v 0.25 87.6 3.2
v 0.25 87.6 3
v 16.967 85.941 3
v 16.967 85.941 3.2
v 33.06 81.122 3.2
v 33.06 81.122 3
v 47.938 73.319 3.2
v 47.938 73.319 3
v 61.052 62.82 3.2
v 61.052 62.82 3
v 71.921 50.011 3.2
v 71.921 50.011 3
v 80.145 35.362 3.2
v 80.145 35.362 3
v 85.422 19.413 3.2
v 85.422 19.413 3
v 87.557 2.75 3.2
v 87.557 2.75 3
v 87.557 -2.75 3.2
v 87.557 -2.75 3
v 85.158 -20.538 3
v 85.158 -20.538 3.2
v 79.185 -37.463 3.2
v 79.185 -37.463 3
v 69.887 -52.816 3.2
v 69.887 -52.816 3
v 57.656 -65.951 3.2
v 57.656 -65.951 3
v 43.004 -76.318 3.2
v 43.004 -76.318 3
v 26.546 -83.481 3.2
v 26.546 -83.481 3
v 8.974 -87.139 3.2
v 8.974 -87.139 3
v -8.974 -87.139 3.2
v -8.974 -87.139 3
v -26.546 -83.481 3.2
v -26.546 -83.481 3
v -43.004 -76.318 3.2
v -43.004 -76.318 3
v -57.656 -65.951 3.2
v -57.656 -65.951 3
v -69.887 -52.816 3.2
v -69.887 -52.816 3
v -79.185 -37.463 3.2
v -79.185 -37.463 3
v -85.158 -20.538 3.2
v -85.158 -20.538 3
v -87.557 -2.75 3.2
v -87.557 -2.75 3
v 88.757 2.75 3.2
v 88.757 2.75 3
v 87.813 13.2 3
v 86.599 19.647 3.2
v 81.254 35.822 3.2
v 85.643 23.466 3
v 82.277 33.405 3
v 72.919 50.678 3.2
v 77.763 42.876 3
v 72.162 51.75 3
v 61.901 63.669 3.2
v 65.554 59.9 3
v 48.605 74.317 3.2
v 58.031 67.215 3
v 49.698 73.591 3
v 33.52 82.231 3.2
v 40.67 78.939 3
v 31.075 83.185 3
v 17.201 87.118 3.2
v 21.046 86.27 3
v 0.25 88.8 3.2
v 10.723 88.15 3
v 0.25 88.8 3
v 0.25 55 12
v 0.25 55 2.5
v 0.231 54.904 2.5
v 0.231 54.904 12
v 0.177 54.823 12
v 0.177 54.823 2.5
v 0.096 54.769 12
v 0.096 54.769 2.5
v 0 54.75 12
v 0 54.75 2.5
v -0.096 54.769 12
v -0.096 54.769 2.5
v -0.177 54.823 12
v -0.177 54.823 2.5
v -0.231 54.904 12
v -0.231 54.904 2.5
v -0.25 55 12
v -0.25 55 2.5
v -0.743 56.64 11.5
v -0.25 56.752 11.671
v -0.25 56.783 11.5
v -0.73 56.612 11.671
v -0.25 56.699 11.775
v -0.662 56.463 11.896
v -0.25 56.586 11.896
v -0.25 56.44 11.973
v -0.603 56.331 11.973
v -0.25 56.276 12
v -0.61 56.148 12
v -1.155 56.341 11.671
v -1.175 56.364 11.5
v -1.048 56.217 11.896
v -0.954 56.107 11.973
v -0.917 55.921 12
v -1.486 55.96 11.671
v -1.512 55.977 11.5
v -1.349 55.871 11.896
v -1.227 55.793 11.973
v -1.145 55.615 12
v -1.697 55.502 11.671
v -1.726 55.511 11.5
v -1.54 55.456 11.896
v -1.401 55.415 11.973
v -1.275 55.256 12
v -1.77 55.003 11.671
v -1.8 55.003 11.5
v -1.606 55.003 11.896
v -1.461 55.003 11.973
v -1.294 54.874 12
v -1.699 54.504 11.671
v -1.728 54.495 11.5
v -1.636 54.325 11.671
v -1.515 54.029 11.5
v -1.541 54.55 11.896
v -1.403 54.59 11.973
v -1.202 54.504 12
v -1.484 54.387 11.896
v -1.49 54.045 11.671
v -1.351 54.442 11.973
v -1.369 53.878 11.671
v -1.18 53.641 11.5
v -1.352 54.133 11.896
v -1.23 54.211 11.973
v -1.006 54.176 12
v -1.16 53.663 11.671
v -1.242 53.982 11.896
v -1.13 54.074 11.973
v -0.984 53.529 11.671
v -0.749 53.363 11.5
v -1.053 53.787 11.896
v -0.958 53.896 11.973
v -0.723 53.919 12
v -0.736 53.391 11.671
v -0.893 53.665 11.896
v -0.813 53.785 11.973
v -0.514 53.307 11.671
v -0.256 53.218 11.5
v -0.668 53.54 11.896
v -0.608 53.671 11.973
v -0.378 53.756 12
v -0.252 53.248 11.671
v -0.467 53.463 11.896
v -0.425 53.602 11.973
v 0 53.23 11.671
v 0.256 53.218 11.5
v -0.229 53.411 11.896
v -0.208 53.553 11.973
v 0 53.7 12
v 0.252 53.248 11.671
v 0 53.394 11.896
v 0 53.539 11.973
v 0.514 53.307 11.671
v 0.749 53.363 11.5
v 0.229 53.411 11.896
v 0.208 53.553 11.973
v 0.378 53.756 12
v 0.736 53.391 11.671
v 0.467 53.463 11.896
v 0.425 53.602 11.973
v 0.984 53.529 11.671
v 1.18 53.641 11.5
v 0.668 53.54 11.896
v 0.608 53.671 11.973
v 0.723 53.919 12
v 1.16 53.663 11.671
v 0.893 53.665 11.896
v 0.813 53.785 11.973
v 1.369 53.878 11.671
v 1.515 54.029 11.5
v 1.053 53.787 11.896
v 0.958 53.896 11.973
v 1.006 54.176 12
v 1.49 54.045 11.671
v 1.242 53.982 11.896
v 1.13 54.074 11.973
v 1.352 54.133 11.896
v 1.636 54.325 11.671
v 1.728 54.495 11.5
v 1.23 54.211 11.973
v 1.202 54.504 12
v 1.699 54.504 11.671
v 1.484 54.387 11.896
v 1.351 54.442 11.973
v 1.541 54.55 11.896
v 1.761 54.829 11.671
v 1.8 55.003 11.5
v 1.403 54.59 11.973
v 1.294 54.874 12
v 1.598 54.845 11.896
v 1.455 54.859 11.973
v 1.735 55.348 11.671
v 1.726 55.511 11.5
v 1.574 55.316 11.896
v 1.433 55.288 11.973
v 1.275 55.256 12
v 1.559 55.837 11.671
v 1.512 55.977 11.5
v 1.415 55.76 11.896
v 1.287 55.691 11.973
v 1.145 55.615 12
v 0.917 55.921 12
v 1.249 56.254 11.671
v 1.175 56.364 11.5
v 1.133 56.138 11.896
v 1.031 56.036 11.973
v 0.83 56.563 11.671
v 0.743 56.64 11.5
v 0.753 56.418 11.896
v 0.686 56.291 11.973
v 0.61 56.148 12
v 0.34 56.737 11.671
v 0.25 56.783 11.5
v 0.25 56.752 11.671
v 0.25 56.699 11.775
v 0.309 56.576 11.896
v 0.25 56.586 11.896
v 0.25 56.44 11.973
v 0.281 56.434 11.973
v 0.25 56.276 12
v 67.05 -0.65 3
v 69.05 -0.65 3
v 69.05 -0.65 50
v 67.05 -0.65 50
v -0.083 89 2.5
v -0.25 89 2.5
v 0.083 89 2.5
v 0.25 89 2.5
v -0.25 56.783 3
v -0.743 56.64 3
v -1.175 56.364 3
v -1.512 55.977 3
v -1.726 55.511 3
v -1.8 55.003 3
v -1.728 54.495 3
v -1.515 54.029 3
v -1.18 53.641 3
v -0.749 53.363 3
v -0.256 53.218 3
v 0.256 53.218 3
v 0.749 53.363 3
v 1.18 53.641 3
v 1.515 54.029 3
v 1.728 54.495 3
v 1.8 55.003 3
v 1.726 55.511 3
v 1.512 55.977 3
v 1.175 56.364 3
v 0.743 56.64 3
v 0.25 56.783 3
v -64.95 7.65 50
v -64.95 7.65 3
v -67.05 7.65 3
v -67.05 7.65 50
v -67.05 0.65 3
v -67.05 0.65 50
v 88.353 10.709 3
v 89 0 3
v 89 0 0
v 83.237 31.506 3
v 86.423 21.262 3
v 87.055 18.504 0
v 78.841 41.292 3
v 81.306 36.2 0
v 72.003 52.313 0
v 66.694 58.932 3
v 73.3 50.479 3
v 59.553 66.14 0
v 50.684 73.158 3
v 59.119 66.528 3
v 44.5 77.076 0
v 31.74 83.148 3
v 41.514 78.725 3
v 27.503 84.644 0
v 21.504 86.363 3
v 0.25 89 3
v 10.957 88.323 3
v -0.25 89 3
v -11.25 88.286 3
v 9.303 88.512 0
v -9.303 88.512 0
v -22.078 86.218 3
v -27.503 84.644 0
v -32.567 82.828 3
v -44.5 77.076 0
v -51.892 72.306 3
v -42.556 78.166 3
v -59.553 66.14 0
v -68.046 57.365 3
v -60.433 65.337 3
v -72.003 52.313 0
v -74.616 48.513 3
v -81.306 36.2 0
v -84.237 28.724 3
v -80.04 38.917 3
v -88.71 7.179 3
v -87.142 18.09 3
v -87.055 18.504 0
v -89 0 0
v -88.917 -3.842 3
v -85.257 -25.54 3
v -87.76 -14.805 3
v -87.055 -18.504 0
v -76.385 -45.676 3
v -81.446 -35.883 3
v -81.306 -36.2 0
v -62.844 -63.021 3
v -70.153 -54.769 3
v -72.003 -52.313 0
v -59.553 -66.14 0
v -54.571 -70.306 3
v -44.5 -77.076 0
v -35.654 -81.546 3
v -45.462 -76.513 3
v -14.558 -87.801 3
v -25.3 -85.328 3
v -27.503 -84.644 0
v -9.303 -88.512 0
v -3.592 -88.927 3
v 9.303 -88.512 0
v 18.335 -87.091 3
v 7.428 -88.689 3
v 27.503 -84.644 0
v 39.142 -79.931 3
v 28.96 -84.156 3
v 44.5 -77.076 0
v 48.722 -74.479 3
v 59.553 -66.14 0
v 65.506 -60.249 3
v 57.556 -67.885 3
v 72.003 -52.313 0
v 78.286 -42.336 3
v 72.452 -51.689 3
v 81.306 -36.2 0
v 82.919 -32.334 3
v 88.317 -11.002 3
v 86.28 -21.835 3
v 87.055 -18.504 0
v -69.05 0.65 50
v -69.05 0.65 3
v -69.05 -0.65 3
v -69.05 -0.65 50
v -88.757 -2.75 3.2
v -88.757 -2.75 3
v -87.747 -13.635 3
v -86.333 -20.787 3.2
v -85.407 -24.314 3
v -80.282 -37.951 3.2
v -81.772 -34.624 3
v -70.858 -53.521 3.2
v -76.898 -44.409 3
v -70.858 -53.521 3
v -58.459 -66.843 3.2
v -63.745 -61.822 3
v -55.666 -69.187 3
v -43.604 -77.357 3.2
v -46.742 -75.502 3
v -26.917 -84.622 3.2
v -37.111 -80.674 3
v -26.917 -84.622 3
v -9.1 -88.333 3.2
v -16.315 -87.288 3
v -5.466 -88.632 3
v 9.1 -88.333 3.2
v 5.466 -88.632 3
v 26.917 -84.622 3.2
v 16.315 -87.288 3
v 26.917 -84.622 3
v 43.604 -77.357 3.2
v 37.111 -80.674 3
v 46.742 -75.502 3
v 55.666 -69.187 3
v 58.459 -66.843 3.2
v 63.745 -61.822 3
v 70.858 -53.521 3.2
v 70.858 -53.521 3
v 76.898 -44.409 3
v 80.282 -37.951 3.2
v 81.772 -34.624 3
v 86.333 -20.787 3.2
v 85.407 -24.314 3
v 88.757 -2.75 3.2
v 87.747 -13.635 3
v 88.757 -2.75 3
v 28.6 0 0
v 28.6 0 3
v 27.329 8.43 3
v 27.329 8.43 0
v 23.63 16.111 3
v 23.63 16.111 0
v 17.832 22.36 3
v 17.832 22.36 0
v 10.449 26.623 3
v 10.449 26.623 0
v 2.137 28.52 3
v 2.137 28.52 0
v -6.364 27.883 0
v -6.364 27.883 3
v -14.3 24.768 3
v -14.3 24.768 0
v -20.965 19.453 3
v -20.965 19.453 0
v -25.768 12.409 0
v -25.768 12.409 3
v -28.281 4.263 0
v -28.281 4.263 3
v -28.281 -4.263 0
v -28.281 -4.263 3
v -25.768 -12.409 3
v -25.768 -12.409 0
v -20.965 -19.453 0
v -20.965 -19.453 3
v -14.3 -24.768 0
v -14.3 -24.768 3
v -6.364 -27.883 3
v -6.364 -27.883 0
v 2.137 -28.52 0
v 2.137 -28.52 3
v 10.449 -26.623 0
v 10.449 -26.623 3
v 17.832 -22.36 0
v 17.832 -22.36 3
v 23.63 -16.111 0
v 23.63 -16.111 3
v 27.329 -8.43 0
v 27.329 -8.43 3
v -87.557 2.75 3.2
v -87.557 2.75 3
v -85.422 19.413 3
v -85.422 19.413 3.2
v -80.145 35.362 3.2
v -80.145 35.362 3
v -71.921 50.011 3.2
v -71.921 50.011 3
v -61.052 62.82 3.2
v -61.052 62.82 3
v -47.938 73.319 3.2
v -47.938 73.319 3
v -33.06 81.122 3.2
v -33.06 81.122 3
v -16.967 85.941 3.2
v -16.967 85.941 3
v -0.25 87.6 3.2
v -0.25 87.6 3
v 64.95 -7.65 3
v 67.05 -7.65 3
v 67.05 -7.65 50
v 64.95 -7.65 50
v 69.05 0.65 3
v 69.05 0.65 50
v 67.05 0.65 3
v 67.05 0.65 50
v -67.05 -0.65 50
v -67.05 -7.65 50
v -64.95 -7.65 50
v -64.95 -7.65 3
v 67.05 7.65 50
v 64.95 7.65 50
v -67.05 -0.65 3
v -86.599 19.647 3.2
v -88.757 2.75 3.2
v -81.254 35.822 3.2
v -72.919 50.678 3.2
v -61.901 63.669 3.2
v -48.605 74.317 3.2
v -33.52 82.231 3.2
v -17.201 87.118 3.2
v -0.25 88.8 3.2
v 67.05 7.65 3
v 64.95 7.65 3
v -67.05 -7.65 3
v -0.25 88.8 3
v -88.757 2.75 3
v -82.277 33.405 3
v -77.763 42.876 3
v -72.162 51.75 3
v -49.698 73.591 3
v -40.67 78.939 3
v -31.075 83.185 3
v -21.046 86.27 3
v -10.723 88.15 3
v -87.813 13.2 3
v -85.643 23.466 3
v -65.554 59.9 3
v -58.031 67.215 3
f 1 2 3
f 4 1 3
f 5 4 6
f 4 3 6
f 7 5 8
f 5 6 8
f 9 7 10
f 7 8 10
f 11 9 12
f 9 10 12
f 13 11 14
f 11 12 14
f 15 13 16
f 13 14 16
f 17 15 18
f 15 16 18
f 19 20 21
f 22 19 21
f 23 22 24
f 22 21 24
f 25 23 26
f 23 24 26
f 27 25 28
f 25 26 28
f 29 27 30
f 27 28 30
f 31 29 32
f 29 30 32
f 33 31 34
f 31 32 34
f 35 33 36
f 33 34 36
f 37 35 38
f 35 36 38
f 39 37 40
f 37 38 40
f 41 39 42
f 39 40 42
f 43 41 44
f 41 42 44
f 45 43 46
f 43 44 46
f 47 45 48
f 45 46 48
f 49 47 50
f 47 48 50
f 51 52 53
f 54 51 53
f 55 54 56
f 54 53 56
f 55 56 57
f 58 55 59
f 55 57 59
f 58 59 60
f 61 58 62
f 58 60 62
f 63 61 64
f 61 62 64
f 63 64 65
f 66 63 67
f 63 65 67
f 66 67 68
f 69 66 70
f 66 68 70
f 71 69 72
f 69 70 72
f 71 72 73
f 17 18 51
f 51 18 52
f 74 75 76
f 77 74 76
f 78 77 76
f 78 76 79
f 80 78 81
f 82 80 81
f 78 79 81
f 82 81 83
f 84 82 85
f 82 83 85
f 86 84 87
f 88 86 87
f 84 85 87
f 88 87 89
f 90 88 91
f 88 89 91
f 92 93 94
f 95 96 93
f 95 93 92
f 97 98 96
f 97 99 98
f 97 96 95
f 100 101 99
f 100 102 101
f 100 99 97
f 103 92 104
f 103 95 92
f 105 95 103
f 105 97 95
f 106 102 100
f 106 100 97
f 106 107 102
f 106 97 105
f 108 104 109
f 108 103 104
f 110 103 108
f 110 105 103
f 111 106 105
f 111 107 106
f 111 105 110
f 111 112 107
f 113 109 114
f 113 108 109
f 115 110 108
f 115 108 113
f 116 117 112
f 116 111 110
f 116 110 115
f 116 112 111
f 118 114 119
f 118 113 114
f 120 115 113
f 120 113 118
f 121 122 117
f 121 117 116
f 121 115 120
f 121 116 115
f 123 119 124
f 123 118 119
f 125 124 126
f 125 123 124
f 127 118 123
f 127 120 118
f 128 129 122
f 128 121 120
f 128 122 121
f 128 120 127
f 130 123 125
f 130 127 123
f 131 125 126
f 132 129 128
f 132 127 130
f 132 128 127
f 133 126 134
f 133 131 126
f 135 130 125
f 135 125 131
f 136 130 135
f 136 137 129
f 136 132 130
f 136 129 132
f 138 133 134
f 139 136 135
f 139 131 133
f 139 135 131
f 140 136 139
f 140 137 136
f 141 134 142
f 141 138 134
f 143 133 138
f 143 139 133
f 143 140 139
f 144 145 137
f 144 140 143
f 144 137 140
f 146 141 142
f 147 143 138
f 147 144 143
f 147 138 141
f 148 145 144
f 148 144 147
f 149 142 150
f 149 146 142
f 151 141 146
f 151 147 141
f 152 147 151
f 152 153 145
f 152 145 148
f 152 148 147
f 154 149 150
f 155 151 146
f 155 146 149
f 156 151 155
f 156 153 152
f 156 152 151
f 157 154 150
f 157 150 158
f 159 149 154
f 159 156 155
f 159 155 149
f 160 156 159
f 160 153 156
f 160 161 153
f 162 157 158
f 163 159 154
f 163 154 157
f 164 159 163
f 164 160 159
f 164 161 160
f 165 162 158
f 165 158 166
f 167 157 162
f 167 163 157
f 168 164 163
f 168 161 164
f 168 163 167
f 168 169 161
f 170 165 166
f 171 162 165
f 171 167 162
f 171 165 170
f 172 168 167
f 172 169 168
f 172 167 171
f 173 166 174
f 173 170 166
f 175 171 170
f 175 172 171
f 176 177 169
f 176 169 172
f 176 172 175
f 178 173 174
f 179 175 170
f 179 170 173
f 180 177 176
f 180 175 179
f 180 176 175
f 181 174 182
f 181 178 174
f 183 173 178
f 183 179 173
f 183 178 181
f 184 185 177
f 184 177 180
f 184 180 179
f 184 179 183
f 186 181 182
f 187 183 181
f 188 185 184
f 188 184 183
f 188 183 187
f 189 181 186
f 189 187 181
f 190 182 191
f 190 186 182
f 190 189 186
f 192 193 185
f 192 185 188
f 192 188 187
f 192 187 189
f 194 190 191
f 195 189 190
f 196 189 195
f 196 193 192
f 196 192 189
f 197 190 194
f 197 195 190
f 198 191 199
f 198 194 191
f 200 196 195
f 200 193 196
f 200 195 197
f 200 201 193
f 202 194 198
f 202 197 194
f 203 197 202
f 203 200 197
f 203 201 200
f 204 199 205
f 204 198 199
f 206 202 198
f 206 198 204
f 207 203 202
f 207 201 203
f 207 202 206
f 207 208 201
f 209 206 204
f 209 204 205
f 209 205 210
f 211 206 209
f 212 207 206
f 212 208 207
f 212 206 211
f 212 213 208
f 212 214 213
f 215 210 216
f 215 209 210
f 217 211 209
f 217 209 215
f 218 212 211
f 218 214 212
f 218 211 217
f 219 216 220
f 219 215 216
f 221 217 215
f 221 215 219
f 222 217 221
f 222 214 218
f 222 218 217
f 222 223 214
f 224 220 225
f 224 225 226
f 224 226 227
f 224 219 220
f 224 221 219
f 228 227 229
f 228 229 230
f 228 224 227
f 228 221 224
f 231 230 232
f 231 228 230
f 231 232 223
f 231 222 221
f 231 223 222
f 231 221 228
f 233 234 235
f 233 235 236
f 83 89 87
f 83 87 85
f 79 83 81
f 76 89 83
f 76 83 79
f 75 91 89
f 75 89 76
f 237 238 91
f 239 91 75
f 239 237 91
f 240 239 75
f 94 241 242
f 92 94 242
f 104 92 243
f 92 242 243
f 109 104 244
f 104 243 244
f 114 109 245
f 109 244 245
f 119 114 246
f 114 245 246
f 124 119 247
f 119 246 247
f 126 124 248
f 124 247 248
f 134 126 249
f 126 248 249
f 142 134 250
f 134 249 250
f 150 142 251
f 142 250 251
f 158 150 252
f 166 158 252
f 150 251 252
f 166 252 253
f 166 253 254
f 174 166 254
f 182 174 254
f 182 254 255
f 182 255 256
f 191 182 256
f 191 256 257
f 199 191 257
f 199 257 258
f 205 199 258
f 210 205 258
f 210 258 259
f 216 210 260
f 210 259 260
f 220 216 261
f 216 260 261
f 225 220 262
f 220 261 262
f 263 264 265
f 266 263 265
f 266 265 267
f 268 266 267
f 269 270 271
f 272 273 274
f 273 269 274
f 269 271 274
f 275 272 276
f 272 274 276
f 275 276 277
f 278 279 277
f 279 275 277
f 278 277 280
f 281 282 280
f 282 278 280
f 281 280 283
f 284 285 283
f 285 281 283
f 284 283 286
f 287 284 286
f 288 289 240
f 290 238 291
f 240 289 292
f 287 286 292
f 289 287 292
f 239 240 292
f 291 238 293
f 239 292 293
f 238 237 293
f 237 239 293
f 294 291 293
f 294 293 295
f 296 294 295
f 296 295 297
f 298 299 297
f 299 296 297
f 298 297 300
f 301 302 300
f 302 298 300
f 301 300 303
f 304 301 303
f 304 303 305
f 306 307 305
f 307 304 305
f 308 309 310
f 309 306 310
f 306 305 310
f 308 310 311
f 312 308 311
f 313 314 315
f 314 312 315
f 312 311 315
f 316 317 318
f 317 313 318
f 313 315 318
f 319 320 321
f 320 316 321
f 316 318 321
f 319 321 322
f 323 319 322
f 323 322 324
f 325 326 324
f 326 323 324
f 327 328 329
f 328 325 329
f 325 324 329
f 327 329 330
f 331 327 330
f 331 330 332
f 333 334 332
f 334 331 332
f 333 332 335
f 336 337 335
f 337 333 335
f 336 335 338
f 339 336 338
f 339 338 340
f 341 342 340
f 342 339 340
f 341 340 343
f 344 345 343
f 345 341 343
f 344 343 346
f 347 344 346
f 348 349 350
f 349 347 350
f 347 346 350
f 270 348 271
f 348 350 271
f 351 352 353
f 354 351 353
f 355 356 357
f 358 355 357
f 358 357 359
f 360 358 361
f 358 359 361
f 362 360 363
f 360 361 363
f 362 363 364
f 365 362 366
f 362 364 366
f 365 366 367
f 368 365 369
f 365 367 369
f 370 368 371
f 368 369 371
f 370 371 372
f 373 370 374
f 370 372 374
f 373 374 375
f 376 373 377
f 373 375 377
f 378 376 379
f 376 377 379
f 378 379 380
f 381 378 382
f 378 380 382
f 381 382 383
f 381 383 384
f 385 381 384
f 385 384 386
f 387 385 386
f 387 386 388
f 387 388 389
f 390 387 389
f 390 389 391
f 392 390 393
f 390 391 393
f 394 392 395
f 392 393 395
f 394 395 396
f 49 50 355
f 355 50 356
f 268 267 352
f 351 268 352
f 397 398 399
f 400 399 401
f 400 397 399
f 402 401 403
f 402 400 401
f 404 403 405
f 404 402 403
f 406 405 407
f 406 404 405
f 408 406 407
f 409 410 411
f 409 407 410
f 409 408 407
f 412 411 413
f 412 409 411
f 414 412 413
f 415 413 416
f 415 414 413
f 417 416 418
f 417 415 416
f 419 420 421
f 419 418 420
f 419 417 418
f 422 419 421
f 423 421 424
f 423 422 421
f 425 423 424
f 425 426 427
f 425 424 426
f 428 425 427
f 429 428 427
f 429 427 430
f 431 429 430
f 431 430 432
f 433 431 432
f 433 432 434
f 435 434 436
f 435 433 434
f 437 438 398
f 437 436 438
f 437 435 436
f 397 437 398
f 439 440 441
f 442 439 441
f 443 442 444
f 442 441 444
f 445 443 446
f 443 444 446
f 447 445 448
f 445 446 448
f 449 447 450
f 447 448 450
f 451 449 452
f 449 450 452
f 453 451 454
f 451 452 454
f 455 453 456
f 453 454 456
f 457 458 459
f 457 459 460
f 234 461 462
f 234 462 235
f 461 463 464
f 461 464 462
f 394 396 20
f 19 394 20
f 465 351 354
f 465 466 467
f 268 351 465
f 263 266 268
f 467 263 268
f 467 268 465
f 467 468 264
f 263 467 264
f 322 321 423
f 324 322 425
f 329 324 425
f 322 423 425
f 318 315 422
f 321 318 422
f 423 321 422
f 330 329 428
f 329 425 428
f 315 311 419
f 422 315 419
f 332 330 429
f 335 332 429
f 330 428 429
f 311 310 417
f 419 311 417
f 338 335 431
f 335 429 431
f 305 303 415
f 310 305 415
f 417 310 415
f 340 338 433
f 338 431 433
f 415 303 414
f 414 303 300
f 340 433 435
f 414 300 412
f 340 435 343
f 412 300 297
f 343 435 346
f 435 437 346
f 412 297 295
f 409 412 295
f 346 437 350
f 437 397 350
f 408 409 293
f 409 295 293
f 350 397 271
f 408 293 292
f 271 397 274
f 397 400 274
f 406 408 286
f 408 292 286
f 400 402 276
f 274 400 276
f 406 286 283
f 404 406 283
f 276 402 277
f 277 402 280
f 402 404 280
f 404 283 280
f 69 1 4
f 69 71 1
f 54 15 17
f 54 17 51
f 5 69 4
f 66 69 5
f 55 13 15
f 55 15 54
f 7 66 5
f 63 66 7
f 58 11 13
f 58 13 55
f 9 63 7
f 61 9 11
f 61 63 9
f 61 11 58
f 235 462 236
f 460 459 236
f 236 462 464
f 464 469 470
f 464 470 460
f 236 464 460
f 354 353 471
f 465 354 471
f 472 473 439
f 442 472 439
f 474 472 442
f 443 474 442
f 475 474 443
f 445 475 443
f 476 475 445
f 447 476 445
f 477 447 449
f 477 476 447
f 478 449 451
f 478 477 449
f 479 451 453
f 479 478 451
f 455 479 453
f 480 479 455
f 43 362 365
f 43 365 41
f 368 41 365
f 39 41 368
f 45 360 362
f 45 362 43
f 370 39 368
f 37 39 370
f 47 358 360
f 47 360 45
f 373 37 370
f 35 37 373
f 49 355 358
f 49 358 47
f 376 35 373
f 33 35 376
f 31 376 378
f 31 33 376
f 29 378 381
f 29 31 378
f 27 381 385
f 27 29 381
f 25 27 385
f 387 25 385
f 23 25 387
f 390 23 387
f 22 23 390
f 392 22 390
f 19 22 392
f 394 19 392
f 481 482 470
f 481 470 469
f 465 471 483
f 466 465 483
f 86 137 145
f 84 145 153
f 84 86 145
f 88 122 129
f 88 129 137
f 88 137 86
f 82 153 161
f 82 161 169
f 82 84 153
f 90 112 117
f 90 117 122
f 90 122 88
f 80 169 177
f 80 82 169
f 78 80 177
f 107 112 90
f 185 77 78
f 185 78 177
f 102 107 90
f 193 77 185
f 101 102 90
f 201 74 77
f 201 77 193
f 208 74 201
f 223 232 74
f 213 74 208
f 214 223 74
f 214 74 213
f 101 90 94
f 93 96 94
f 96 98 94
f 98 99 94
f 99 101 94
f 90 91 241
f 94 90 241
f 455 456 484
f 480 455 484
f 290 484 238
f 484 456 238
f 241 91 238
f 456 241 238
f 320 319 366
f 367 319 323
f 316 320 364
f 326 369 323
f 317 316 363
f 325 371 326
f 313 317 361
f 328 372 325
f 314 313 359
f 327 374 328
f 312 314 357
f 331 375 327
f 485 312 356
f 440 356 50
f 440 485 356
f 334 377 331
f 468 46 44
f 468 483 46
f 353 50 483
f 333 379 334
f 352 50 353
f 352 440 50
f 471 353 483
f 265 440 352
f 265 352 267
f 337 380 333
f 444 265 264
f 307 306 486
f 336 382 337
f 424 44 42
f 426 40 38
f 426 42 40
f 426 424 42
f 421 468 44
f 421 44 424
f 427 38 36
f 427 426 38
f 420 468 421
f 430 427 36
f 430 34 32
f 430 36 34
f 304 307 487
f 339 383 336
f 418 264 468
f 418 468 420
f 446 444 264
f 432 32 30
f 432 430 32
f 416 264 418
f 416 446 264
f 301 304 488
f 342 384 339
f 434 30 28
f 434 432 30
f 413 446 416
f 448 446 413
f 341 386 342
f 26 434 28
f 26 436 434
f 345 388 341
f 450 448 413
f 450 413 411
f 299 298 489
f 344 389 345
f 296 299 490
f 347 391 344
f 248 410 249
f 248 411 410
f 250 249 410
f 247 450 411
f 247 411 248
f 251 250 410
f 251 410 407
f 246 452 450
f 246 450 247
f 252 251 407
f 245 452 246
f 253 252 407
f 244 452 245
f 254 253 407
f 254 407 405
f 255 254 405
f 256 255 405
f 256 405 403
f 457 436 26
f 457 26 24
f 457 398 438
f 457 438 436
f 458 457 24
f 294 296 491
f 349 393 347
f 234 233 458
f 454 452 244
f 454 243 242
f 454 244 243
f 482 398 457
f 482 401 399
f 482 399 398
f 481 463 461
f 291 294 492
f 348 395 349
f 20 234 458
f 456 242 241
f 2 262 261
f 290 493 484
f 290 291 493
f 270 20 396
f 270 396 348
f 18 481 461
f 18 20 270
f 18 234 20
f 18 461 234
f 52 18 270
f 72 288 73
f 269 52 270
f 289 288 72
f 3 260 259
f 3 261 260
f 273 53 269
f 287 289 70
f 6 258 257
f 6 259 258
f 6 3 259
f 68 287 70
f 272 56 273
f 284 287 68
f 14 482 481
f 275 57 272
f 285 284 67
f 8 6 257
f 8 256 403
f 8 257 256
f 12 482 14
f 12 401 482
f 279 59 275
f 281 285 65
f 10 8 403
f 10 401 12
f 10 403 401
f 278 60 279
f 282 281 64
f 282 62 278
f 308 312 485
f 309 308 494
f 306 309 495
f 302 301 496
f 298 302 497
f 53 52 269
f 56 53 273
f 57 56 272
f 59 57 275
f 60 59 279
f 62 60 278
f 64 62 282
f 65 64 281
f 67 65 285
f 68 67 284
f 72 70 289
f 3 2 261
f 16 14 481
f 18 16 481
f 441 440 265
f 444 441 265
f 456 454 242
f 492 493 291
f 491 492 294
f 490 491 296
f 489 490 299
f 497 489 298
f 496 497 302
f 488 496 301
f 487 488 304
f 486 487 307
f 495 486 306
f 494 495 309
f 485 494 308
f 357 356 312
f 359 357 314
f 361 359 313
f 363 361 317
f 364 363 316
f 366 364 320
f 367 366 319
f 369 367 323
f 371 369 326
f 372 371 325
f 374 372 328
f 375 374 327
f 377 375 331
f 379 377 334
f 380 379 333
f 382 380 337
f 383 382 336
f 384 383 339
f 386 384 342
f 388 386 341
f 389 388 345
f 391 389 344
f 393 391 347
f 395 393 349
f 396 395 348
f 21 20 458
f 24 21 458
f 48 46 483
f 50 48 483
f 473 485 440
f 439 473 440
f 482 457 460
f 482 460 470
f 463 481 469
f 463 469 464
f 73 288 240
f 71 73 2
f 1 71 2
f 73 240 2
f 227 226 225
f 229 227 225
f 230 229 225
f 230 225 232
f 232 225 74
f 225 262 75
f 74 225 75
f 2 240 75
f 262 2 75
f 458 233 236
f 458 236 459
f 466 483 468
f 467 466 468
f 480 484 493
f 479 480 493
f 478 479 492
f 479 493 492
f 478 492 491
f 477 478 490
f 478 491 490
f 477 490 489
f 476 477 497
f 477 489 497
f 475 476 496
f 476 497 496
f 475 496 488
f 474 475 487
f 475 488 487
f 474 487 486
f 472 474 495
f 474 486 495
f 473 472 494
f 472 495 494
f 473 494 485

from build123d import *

# Parameters (mm, degrees)
F0_R      = 89
F0_R_2    = 28.6
F1_DEPTH  = 3
F3_DEPTH  = 47
F6_DEPTH  = 9
F7_R      = 0.5
F9_DEPTH  = 0.2
F11_DEPTH = 9.5


with BuildPart() as f1:
    # F0 (on Top) → F1 (new body)
    with BuildSketch(Plane.XY):
        Circle(F0_R)
        Circle(F0_R_2, mode=Mode.SUBTRACT)
    extrude(amount=F1_DEPTH)

    # F2 (on face) → F3 (join)
    with BuildSketch(Plane.XY.offset(3)):
        Polygon((-64.95, 7.65), (-67.05, 7.65), (-67.05, 0.65), (-69.05, 0.65), (-69.05, -0.65), (-67.05, -0.65), (-67.05, -7.65), (-64.95, -7.65), align=None)
    extrude(amount=F3_DEPTH)

    # F4: F1 across plane


with BuildPart() as f1_1:
    add(f1.part)
    add(f1.part.mirror(Plane.YZ))

    # F5 (on face) → F6 (join)
    with BuildSketch(Plane.XY.offset(3)):
        with BuildLine():
            Line((-0.25, 55), (-0.25, 56.782554))
            ThreePointArc((-0.25, 56.782554), (0, 53.2), (0.25, 56.782554))
            Line((0.25, 56.782554), (0.25, 55))
            ThreePointArc((0.25, 55), (0, 54.75), (-0.25, 55))
        make_face()
    extrude(amount=F6_DEPTH)

    # F7
    f7_edges = [f1_1.edges().sort_by_distance(p)[0] for p in [
        (0, 53.2, 12),
    ]]
    fillet(f7_edges, radius=F7_R)

    # F8 (on face) → F9 (join)
    with BuildSketch(Plane.XY.offset(3)):
        with BuildLine():
            Line((87.556824, 2.75), (88.757408, 2.75))
            ThreePointArc((88.757408, 2.75), (0, 88.8), (-88.757408, 2.75))
            Line((-88.757408, 2.75), (-87.556824, 2.75))
            ThreePointArc((-87.556824, 2.75), (0, 87.6), (87.556824, 2.75))
        make_face()
        with BuildLine():
            Line((88.757408, -2.75), (87.556824, -2.75))
            ThreePointArc((87.556824, -2.75), (0, -87.6), (-87.556824, -2.75))
            Line((-87.556824, -2.75), (-88.757408, -2.75))
            ThreePointArc((-88.757408, -2.75), (0, -88.8), (88.757408, -2.75))
        make_face()
    extrude(amount=F9_DEPTH)

    # F10 (on face) → F11 (cut)
    with BuildSketch(Plane.XY.offset(12)):
        with BuildLine():
            Line((0.25, 55), (0.25, 56.275735))
            Line((0.25, 56.275735), (0.25, 92))
            Line((0.25, 92), (-0.25, 92))
            Line((-0.25, 92), (-0.25, 56.275735))
            Line((-0.25, 56.275735), (-0.25, 55))
            ThreePointArc((-0.25, 55), (0, 54.75), (0.25, 55))
        make_face()
    extrude(amount=-F11_DEPTH, mode=Mode.SUBTRACT)


solid = f1_1.part
